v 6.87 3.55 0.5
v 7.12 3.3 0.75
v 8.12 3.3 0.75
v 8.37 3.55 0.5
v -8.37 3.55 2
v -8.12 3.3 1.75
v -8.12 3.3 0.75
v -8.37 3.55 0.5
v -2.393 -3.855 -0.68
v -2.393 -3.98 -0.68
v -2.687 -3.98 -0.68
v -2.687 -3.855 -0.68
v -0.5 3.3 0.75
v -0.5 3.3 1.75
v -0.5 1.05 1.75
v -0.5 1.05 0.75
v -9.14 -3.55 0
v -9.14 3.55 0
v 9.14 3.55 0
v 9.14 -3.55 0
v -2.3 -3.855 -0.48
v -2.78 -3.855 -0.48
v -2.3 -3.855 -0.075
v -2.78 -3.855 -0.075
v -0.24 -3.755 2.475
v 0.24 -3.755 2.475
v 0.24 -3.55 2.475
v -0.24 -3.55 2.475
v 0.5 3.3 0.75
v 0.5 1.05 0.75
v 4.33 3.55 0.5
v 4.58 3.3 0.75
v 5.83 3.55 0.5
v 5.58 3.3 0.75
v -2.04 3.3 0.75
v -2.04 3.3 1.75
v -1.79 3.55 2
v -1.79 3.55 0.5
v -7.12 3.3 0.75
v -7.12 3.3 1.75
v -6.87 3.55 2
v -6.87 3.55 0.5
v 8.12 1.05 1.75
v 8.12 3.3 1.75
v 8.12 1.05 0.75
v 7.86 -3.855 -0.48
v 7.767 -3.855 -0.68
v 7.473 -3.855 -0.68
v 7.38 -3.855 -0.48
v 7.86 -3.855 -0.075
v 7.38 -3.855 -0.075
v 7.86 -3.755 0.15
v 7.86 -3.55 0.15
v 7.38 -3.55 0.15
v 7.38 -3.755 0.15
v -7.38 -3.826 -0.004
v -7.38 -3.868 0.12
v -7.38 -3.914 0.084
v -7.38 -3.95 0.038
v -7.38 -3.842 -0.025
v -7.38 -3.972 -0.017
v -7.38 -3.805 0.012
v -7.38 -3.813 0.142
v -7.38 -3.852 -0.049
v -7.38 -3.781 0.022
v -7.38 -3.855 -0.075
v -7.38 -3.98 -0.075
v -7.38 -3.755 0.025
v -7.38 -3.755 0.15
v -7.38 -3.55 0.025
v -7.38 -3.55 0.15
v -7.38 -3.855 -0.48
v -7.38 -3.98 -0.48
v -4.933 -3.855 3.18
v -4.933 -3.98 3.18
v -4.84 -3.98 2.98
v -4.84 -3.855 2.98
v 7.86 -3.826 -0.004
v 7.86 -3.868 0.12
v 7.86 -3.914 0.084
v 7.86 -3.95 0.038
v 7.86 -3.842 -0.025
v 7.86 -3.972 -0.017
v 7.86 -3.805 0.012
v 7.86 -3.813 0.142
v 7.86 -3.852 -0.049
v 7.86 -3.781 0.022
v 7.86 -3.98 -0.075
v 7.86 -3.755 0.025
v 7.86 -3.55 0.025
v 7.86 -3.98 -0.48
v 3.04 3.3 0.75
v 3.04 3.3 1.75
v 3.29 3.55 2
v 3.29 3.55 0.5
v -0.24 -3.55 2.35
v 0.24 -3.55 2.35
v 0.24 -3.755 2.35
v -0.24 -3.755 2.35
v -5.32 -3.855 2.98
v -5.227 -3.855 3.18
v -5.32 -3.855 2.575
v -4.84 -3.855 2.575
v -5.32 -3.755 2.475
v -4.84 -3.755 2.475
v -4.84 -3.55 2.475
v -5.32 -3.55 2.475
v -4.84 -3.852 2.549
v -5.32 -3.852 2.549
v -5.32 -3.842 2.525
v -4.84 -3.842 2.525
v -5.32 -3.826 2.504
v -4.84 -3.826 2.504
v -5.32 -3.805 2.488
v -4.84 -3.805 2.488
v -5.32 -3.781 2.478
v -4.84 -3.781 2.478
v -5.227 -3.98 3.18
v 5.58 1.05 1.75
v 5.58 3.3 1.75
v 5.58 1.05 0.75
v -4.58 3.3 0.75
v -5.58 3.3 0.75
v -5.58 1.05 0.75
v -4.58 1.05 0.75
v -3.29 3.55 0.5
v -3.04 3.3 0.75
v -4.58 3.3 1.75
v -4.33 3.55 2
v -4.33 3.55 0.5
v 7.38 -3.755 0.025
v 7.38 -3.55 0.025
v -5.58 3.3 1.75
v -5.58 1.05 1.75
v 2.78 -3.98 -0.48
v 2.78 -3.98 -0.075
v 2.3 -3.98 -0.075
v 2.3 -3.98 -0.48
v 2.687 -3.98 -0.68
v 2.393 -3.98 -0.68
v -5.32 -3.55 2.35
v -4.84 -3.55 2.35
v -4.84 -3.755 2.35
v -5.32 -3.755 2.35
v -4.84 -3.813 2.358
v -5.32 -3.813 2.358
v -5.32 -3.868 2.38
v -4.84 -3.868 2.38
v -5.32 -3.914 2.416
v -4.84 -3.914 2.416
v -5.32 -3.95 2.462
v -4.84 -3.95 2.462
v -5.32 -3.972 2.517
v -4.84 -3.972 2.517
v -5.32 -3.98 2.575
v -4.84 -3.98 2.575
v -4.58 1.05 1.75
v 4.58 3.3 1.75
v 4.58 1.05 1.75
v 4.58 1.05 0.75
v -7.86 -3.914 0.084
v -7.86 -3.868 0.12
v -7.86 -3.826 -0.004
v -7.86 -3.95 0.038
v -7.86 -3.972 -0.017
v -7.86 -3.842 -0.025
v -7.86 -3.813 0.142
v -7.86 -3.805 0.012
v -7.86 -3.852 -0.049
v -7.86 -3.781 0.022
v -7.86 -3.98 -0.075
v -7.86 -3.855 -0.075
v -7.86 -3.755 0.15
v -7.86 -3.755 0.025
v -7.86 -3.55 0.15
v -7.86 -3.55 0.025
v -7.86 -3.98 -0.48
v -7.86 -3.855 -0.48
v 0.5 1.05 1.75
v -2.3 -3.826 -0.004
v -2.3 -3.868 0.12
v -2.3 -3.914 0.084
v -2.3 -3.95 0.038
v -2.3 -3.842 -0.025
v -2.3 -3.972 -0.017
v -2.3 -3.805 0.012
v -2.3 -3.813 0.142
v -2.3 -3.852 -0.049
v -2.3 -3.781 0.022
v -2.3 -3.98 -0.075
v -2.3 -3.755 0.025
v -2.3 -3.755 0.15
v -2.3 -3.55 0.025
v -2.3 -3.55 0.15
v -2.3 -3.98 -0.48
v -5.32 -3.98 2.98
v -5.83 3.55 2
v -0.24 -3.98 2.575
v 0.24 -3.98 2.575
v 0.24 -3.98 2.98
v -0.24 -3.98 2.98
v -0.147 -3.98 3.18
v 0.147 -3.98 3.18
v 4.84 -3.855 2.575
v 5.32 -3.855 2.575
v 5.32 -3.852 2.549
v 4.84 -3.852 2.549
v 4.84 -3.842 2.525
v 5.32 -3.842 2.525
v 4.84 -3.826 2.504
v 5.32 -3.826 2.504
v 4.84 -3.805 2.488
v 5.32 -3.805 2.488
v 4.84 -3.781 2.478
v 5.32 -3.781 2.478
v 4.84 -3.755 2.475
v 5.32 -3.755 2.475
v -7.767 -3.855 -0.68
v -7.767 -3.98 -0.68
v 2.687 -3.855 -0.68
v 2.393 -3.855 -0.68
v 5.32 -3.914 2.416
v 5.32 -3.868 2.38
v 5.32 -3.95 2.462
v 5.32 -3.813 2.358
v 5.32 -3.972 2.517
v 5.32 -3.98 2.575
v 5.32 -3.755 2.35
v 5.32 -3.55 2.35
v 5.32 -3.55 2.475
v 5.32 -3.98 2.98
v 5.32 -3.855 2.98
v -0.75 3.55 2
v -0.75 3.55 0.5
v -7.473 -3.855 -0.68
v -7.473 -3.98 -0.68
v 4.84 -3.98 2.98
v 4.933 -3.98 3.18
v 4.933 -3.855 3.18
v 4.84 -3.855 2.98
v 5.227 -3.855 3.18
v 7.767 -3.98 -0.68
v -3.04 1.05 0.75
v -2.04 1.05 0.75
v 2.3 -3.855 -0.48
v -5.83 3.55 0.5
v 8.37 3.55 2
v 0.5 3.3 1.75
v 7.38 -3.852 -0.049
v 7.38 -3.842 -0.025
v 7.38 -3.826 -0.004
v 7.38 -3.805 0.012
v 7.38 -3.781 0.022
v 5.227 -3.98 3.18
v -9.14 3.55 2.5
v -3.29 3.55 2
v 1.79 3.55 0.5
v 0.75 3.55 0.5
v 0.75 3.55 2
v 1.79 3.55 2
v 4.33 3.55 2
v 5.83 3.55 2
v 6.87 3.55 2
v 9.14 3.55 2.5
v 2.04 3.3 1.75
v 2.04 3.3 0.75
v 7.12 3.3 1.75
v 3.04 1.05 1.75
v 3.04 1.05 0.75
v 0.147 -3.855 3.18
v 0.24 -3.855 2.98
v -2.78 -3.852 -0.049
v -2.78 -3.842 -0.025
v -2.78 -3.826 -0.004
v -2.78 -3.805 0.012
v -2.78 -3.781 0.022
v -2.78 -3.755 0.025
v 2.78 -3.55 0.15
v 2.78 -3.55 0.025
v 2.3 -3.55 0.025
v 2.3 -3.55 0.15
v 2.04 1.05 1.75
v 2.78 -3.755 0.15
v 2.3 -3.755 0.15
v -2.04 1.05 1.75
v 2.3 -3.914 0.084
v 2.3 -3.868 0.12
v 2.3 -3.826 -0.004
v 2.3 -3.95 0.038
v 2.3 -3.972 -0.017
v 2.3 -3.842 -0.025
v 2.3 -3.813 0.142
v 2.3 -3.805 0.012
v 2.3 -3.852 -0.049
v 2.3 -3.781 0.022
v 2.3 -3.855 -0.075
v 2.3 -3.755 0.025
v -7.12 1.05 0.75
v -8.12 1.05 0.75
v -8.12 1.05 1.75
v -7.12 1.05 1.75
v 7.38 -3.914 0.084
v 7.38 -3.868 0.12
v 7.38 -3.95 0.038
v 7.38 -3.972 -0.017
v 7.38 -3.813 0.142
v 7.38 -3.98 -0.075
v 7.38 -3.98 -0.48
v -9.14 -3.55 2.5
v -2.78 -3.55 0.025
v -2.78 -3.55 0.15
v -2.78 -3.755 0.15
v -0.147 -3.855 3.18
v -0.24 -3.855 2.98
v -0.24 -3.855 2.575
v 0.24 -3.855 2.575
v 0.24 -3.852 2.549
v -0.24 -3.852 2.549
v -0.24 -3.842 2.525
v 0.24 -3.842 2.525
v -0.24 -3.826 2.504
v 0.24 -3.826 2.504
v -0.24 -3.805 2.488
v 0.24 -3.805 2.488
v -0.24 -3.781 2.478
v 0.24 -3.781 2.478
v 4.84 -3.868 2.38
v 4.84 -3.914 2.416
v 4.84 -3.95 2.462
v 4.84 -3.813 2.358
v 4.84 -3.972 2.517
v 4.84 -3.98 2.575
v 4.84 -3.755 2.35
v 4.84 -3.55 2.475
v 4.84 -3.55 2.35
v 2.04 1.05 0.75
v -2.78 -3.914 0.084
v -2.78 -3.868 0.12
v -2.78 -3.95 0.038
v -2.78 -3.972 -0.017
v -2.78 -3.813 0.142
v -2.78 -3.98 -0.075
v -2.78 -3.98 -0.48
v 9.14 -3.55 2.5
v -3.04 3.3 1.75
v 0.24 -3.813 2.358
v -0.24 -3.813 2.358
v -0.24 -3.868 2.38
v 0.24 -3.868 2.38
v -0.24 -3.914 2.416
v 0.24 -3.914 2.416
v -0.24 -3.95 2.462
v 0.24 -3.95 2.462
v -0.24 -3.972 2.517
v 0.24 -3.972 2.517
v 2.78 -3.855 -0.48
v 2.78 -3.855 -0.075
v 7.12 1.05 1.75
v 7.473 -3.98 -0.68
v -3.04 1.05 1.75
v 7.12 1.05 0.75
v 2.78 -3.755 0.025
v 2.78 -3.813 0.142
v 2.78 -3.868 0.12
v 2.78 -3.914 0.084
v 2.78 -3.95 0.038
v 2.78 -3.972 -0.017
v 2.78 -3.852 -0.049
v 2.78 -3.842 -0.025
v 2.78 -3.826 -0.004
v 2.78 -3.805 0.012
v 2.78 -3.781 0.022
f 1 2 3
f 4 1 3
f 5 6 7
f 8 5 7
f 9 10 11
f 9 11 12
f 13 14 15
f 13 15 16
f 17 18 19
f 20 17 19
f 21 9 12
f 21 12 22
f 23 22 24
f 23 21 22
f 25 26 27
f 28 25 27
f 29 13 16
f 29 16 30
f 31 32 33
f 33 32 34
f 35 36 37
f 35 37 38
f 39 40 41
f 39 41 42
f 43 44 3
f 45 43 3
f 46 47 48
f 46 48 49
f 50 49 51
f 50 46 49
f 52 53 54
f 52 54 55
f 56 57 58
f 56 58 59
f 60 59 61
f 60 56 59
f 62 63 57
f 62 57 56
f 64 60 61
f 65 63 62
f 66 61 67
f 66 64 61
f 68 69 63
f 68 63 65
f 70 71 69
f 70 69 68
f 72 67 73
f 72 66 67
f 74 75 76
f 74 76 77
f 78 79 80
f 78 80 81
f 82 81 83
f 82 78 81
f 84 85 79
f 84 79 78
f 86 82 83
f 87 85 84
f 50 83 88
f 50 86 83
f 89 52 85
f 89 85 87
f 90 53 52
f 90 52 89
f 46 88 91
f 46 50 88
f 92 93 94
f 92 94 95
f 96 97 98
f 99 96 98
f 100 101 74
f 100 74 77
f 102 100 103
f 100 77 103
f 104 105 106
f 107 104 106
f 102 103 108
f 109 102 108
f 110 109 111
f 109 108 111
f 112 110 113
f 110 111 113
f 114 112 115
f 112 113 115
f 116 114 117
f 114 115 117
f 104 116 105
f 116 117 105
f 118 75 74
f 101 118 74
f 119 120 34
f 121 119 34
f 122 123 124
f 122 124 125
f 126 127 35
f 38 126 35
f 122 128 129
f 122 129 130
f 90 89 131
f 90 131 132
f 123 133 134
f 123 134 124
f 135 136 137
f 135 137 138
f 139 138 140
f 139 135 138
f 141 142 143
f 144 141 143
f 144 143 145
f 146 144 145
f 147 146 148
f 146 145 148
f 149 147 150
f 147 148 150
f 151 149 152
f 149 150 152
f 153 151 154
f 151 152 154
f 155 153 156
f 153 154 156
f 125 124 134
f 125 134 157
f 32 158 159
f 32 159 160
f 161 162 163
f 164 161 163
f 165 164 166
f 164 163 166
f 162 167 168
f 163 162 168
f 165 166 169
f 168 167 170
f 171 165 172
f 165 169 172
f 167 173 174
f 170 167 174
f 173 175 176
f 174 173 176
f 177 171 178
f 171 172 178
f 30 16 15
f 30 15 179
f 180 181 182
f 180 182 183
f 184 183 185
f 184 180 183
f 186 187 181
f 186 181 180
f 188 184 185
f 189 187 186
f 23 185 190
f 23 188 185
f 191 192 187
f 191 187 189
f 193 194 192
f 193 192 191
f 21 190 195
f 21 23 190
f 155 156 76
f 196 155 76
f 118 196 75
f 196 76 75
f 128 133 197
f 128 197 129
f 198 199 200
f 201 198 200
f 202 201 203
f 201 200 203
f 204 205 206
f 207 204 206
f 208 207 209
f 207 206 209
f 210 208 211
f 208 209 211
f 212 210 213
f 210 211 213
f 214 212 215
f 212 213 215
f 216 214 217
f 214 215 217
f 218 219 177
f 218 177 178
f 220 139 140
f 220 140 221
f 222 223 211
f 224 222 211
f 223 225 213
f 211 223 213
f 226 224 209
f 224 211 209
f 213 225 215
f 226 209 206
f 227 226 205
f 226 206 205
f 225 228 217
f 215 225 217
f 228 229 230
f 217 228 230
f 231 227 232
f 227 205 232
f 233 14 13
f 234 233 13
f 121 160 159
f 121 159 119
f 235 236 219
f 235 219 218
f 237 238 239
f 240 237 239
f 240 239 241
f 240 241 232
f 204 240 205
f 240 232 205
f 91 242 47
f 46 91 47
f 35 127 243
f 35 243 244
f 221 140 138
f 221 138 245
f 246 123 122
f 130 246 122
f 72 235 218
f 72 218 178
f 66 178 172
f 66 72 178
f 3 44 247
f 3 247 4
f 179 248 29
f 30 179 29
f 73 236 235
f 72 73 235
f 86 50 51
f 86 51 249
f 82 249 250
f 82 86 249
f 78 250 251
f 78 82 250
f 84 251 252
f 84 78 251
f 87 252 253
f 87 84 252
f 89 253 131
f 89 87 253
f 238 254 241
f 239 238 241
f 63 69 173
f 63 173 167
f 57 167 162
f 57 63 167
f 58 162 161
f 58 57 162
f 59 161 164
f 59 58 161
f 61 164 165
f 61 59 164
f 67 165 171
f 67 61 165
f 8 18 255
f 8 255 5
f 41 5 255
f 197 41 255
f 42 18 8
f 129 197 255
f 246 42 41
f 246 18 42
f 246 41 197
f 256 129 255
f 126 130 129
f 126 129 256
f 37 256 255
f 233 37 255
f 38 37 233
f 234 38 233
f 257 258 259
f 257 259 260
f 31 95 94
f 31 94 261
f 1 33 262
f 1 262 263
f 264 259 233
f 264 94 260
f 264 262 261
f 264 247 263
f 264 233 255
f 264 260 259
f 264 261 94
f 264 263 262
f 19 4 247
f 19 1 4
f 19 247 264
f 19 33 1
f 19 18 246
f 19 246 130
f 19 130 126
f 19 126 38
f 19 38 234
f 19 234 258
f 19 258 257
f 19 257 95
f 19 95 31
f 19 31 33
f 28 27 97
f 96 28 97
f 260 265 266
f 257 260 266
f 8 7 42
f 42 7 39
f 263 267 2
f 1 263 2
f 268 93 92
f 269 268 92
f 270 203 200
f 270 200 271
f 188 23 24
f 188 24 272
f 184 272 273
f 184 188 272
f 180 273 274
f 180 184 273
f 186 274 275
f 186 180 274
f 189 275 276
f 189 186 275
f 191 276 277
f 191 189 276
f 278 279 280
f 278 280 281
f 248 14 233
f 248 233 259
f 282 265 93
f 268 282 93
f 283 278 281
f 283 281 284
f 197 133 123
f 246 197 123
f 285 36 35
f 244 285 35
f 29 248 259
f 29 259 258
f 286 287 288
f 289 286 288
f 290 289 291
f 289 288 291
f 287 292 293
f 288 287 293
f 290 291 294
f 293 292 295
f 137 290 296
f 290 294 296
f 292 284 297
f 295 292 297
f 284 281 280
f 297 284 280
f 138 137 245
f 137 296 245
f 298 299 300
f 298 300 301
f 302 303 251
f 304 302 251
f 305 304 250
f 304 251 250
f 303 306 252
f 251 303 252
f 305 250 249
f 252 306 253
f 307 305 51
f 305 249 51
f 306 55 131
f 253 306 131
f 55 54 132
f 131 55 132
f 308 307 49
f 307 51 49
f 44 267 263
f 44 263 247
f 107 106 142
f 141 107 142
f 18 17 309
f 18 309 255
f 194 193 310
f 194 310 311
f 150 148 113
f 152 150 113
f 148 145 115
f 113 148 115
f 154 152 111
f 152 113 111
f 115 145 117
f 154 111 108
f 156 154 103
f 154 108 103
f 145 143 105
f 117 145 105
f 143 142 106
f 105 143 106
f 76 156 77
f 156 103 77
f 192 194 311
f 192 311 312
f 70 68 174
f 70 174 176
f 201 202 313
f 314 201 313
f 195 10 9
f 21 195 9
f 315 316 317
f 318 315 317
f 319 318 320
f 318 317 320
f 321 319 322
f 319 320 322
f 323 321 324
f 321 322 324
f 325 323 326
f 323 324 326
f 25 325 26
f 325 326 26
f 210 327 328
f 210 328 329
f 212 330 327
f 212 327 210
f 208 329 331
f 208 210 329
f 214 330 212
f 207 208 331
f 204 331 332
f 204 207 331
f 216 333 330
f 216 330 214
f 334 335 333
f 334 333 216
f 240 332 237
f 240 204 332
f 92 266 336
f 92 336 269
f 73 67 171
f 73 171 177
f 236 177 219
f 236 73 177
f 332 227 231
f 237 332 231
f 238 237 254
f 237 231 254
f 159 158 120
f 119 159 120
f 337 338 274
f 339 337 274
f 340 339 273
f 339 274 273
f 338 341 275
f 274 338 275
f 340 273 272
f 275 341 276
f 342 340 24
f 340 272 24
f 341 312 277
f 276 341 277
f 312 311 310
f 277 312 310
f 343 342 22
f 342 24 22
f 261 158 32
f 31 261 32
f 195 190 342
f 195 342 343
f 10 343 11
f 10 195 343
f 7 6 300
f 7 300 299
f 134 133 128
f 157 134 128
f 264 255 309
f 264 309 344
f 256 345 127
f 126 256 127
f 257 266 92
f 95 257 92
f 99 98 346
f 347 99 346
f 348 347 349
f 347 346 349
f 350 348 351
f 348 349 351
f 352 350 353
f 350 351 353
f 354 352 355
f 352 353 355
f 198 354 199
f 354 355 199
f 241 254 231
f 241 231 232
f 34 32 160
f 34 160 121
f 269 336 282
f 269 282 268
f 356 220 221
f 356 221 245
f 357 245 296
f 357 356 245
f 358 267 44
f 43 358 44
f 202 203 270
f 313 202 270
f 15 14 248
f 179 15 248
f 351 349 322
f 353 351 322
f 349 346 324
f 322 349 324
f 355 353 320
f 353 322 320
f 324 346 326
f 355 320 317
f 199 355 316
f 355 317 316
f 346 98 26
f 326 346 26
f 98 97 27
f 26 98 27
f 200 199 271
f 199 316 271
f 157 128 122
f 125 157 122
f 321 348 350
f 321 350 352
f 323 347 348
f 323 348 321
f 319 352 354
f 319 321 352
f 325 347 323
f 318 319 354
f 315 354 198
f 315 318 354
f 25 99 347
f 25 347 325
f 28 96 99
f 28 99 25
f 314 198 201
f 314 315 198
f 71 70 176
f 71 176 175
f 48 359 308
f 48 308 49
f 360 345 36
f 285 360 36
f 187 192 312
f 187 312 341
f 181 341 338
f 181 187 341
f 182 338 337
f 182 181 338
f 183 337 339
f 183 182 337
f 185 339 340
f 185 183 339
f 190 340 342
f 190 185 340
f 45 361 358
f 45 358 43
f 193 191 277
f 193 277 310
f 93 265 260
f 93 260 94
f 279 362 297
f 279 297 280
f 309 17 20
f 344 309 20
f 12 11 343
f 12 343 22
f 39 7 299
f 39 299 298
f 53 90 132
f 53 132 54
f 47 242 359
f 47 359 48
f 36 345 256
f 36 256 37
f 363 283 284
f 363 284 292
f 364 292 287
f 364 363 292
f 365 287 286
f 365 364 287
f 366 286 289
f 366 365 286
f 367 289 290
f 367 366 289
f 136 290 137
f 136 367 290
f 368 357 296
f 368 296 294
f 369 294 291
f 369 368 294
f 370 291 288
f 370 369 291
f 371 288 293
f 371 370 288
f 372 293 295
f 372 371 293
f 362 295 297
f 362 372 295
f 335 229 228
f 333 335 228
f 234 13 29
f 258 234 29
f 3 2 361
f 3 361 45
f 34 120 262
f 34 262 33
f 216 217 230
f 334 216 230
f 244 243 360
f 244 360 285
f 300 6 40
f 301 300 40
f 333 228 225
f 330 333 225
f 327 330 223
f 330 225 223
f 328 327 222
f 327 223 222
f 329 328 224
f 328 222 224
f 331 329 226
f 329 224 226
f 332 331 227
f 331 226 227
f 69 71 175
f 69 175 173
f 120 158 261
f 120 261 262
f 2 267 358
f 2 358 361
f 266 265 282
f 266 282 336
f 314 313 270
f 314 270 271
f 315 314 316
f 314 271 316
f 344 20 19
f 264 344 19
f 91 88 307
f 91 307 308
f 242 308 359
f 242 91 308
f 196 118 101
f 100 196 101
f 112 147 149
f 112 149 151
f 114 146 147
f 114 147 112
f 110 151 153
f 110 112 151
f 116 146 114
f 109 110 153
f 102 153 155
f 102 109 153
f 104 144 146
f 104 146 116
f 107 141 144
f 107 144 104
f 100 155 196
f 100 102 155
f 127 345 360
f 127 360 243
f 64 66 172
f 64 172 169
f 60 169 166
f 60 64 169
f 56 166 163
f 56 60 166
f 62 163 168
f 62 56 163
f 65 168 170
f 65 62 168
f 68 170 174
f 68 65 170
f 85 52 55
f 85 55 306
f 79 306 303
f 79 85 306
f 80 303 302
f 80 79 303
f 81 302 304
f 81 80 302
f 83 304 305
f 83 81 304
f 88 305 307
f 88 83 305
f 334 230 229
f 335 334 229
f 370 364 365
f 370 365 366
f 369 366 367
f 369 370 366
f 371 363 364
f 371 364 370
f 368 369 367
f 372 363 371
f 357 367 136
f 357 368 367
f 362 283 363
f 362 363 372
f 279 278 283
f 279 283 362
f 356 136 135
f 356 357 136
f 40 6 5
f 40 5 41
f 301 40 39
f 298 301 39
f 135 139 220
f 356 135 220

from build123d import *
from OCP.BRepFilletAPI import BRepFilletAPI_MakeChamfer

# Parameters (mm, degrees)
SKETCH1_W                  = 18.28
SKETCH1_H                  = 7.1
BOSS_EXTRUDE1_DEPTH        = 2.5
SKETCH2_W                  = 1
SKETCH2_H                  = 1
CUT_EXTRUDE1_DEPTH         = 2.5
CHAMFER1_SIZE              = 0.25
LPATTERN6_COUNT            = 7
LPATTERN6_PITCH            = 2.54
CHAMFER1_OF_LPATTERN6_SIZE = 0.25
BASE_FLANGE2_DEPTH         = 0.24
BASE_FLANGE2_DEPTH_BACK    = 0.24
BASE_FLANGE3_DEPTH         = 0.24
BASE_FLANGE3_DEPTH_BACK    = 0.24
CHAMFER3_SIZE              = 0.2
CHAMFER3_SIZE2             = 0.093261532
CHAMFER4_SIZE              = 0.2
CHAMFER4_SIZE2             = 0.093261532
LPATTERN4_COUNT            = 4
LPATTERN4_PITCH            = 5.08
LPATTERN3_COUNT            = 3
LPATTERN3_PITCH            = 5.08


# Sheet-metal steps are written as plain solids
with BuildPart() as part:
    # Sketch1 → Boss-Extrude1 (new body)
    with BuildSketch(Plane.XY):
        Rectangle(SKETCH1_W, SKETCH1_H)
    extrude(amount=BOSS_EXTRUDE1_DEPTH)

    # Sketch2 → Cut-Extrude1 (cut)
    with BuildSketch(Plane(origin=(0, 3.55, 0), x_dir=(1, 0, 0), z_dir=(0, 1, 0))):
        with Locations((-7.62, -1.25)):
            Rectangle(SKETCH2_W, SKETCH2_H)
    cut_extrude1 = extrude(amount=-CUT_EXTRUDE1_DEPTH, mode=Mode.SUBTRACT)

    # Chamfer1
    chamfer1_edges = [part.edges().sort_by_distance(p)[0] for p in [
        (-7.12, 3.55, 1.25),
        (-7.62, 3.55, 0.75),
        (-8.12, 3.55, 1.25),
        (-7.62, 3.55, 1.75),
    ]]
    chamfer(chamfer1_edges, length=CHAMFER1_SIZE)

    # LPattern6: Cut-Extrude1 ×7
    with Locations(*[(i * LPATTERN6_PITCH, 0, 0) for i in range(1, LPATTERN6_COUNT)]):
        add(cut_extrude1, mode=Mode.SUBTRACT)

    # Chamfer1 of LPattern6
    chamfer1_of_lpattern6_edges = [part.edges().sort_by_distance(p)[0] for p in [
        (-4.58, 3.55, 1.25),
        (-5.08, 3.55, 0.75),
        (-5.58, 3.55, 1.25),
        (-5.08, 3.55, 1.75),
        (-2.04, 3.55, 1.25),
        (-2.54, 3.55, 0.75),
        (-3.04, 3.55, 1.25),
        (-2.54, 3.55, 1.75),
        (0.5, 3.55, 1.25),
        (0, 3.55, 0.75),
        (-0.5, 3.55, 1.25),
        (0, 3.55, 1.75),
        (3.04, 3.55, 1.25),
        (2.54, 3.55, 0.75),
        (2.04, 3.55, 1.25),
        (2.54, 3.55, 1.75),
        (5.58, 3.55, 1.25),
        (5.08, 3.55, 0.75),
        (4.58, 3.55, 1.25),
        (5.08, 3.55, 1.75),
        (8.12, 3.55, 1.25),
        (7.62, 3.55, 0.75),
        (7.12, 3.55, 1.25),
        (7.62, 3.55, 1.75),
    ]]
    chamfer(chamfer1_of_lpattern6_edges, length=CHAMFER1_OF_LPATTERN6_SIZE)


with BuildPart() as body_2:
    # Sketch5 → Base-Flange2 (new, two sides: drawn at the far end of the back side and taken through both)
    with BuildSketch(Plane.ZY.offset(7.62).offset(-BASE_FLANGE2_DEPTH_BACK)):
        with BuildLine():
            Line((0.15, -3.55), (0.15, -3.755))
            ThreePointArc((0.15, -3.755), (0.084099026, -3.914099026), (-0.075, -3.98))
            Line((-0.075, -3.98), (-0.68, -3.98))
            Line((-0.68, -3.98), (-0.68, -3.855))
            Line((-0.68, -3.855), (-0.075, -3.855))
            ThreePointArc((-0.075, -3.855), (-0.004289322, -3.825710678), (0.025, -3.755))
            Line((0.025, -3.755), (0.025, -3.55))
            Line((0.025, -3.55), (0.15, -3.55))
        make_face()
    extrude(amount=BASE_FLANGE2_DEPTH + BASE_FLANGE2_DEPTH_BACK)

    # Chamfer4: one chamfer whose edges measure the first distance from different faces: ONE call of the kernel's chamfer builder (chamfer() names one face for all edges)
    chamfer4_edges_1 = [body_2.edges().sort_by_distance(p)[0] for p in [
        (-7.38, -3.9175, -0.68),
    ]]
    chamfer4_side_1 = [body_2.faces().sort_by_distance(p)[0] for p in [
        (-7.38, -3.6525, 0.034347727),
    ]]
    chamfer4_edges_2 = [body_2.edges().sort_by_distance(p)[0] for p in [
        (-7.86, -3.9175, -0.68),
    ]]
    chamfer4_side_2 = [body_2.faces().sort_by_distance(p)[0] for p in [
        (-7.86, -3.6525, 0.034347727),
    ]]
    chamfer4 = BRepFilletAPI_MakeChamfer(body_2.part.solid().wrapped)
    for e in chamfer4_edges_1:
        chamfer4.Add(CHAMFER4_SIZE, CHAMFER4_SIZE2, e.wrapped, chamfer4_side_1[0].wrapped)  # the first distance lies on this face
    for e in chamfer4_edges_2:
        chamfer4.Add(CHAMFER4_SIZE, CHAMFER4_SIZE2, e.wrapped, chamfer4_side_2[0].wrapped)  # the first distance lies on this face
    add(Compound.cast(chamfer4.Shape()), mode=Mode.REPLACE)


with BuildPart() as body_3:
    # Sketch22 → Base-Flange3 (new, two sides: drawn at the far end of the back side and taken through both)
    with BuildSketch(Plane.ZY.offset(5.08).offset(-BASE_FLANGE3_DEPTH_BACK)):
        with BuildLine():
            Line((2.35, -3.55), (2.35, -3.755))
            ThreePointArc((2.35, -3.755), (2.415900974, -3.914099026), (2.575, -3.98))
            Line((2.575, -3.98), (3.18, -3.98))
            Line((3.18, -3.98), (3.18, -3.855))
            Line((3.18, -3.855), (2.575, -3.855))
            ThreePointArc((2.575, -3.855), (2.504289322, -3.825710678), (2.475, -3.755))
            Line((2.475, -3.755), (2.475, -3.55))
            Line((2.475, -3.55), (2.35, -3.55))
        make_face()
    extrude(amount=BASE_FLANGE3_DEPTH + BASE_FLANGE3_DEPTH_BACK)

    # Chamfer3: one chamfer whose edges measure the first distance from different faces: ONE call of the kernel's chamfer builder (chamfer() names one face for all edges)
    chamfer3_edges_1 = [body_3.edges().sort_by_distance(p)[0] for p in [
        (-4.84, -3.9175, 3.18),
    ]]
    chamfer3_side_1 = [body_3.faces().sort_by_distance(p)[0] for p in [
        (-4.84, -3.6525, 2.465652273),
    ]]
    chamfer3_edges_2 = [body_3.edges().sort_by_distance(p)[0] for p in [
        (-5.32, -3.9175, 3.18),
    ]]
    chamfer3_side_2 = [body_3.faces().sort_by_distance(p)[0] for p in [
        (-5.32, -3.6525, 2.465652273),
    ]]
    chamfer3 = BRepFilletAPI_MakeChamfer(body_3.part.solid().wrapped)
    for e in chamfer3_edges_1:
        chamfer3.Add(CHAMFER3_SIZE, CHAMFER3_SIZE2, e.wrapped, chamfer3_side_1[0].wrapped)  # the first distance lies on this face
    for e in chamfer3_edges_2:
        chamfer3.Add(CHAMFER3_SIZE, CHAMFER3_SIZE2, e.wrapped, chamfer3_side_2[0].wrapped)  # the first distance lies on this face
    add(Compound.cast(chamfer3.Shape()), mode=Mode.REPLACE)


with BuildPart() as lpattern4_1:
    # LPattern4: pattern copy
    add(body_2.part.moved(Location(Vector(1, 0, 0) * (1 * LPATTERN4_PITCH))))


with BuildPart() as lpattern4_2:
    # LPattern4: pattern copy
    add(body_2.part.moved(Location(Vector(1, 0, 0) * (2 * LPATTERN4_PITCH))))


with BuildPart() as lpattern4_3:
    # LPattern4: pattern copy
    add(body_2.part.moved(Location(Vector(1, 0, 0) * (3 * LPATTERN4_PITCH))))


with BuildPart() as lpattern3_1:
    # LPattern3: pattern copy
    add(body_3.part.moved(Location(Vector(1, 0, 0) * (1 * LPATTERN3_PITCH))))


with BuildPart() as lpattern3_2:
    # LPattern3: pattern copy
    add(body_3.part.moved(Location(Vector(1, 0, 0) * (2 * LPATTERN3_PITCH))))


solid = Compound([part.part, body_2.part, body_3.part, lpattern4_1.part, lpattern4_2.part, lpattern4_3.part, lpattern3_1.part, lpattern3_2.part])
